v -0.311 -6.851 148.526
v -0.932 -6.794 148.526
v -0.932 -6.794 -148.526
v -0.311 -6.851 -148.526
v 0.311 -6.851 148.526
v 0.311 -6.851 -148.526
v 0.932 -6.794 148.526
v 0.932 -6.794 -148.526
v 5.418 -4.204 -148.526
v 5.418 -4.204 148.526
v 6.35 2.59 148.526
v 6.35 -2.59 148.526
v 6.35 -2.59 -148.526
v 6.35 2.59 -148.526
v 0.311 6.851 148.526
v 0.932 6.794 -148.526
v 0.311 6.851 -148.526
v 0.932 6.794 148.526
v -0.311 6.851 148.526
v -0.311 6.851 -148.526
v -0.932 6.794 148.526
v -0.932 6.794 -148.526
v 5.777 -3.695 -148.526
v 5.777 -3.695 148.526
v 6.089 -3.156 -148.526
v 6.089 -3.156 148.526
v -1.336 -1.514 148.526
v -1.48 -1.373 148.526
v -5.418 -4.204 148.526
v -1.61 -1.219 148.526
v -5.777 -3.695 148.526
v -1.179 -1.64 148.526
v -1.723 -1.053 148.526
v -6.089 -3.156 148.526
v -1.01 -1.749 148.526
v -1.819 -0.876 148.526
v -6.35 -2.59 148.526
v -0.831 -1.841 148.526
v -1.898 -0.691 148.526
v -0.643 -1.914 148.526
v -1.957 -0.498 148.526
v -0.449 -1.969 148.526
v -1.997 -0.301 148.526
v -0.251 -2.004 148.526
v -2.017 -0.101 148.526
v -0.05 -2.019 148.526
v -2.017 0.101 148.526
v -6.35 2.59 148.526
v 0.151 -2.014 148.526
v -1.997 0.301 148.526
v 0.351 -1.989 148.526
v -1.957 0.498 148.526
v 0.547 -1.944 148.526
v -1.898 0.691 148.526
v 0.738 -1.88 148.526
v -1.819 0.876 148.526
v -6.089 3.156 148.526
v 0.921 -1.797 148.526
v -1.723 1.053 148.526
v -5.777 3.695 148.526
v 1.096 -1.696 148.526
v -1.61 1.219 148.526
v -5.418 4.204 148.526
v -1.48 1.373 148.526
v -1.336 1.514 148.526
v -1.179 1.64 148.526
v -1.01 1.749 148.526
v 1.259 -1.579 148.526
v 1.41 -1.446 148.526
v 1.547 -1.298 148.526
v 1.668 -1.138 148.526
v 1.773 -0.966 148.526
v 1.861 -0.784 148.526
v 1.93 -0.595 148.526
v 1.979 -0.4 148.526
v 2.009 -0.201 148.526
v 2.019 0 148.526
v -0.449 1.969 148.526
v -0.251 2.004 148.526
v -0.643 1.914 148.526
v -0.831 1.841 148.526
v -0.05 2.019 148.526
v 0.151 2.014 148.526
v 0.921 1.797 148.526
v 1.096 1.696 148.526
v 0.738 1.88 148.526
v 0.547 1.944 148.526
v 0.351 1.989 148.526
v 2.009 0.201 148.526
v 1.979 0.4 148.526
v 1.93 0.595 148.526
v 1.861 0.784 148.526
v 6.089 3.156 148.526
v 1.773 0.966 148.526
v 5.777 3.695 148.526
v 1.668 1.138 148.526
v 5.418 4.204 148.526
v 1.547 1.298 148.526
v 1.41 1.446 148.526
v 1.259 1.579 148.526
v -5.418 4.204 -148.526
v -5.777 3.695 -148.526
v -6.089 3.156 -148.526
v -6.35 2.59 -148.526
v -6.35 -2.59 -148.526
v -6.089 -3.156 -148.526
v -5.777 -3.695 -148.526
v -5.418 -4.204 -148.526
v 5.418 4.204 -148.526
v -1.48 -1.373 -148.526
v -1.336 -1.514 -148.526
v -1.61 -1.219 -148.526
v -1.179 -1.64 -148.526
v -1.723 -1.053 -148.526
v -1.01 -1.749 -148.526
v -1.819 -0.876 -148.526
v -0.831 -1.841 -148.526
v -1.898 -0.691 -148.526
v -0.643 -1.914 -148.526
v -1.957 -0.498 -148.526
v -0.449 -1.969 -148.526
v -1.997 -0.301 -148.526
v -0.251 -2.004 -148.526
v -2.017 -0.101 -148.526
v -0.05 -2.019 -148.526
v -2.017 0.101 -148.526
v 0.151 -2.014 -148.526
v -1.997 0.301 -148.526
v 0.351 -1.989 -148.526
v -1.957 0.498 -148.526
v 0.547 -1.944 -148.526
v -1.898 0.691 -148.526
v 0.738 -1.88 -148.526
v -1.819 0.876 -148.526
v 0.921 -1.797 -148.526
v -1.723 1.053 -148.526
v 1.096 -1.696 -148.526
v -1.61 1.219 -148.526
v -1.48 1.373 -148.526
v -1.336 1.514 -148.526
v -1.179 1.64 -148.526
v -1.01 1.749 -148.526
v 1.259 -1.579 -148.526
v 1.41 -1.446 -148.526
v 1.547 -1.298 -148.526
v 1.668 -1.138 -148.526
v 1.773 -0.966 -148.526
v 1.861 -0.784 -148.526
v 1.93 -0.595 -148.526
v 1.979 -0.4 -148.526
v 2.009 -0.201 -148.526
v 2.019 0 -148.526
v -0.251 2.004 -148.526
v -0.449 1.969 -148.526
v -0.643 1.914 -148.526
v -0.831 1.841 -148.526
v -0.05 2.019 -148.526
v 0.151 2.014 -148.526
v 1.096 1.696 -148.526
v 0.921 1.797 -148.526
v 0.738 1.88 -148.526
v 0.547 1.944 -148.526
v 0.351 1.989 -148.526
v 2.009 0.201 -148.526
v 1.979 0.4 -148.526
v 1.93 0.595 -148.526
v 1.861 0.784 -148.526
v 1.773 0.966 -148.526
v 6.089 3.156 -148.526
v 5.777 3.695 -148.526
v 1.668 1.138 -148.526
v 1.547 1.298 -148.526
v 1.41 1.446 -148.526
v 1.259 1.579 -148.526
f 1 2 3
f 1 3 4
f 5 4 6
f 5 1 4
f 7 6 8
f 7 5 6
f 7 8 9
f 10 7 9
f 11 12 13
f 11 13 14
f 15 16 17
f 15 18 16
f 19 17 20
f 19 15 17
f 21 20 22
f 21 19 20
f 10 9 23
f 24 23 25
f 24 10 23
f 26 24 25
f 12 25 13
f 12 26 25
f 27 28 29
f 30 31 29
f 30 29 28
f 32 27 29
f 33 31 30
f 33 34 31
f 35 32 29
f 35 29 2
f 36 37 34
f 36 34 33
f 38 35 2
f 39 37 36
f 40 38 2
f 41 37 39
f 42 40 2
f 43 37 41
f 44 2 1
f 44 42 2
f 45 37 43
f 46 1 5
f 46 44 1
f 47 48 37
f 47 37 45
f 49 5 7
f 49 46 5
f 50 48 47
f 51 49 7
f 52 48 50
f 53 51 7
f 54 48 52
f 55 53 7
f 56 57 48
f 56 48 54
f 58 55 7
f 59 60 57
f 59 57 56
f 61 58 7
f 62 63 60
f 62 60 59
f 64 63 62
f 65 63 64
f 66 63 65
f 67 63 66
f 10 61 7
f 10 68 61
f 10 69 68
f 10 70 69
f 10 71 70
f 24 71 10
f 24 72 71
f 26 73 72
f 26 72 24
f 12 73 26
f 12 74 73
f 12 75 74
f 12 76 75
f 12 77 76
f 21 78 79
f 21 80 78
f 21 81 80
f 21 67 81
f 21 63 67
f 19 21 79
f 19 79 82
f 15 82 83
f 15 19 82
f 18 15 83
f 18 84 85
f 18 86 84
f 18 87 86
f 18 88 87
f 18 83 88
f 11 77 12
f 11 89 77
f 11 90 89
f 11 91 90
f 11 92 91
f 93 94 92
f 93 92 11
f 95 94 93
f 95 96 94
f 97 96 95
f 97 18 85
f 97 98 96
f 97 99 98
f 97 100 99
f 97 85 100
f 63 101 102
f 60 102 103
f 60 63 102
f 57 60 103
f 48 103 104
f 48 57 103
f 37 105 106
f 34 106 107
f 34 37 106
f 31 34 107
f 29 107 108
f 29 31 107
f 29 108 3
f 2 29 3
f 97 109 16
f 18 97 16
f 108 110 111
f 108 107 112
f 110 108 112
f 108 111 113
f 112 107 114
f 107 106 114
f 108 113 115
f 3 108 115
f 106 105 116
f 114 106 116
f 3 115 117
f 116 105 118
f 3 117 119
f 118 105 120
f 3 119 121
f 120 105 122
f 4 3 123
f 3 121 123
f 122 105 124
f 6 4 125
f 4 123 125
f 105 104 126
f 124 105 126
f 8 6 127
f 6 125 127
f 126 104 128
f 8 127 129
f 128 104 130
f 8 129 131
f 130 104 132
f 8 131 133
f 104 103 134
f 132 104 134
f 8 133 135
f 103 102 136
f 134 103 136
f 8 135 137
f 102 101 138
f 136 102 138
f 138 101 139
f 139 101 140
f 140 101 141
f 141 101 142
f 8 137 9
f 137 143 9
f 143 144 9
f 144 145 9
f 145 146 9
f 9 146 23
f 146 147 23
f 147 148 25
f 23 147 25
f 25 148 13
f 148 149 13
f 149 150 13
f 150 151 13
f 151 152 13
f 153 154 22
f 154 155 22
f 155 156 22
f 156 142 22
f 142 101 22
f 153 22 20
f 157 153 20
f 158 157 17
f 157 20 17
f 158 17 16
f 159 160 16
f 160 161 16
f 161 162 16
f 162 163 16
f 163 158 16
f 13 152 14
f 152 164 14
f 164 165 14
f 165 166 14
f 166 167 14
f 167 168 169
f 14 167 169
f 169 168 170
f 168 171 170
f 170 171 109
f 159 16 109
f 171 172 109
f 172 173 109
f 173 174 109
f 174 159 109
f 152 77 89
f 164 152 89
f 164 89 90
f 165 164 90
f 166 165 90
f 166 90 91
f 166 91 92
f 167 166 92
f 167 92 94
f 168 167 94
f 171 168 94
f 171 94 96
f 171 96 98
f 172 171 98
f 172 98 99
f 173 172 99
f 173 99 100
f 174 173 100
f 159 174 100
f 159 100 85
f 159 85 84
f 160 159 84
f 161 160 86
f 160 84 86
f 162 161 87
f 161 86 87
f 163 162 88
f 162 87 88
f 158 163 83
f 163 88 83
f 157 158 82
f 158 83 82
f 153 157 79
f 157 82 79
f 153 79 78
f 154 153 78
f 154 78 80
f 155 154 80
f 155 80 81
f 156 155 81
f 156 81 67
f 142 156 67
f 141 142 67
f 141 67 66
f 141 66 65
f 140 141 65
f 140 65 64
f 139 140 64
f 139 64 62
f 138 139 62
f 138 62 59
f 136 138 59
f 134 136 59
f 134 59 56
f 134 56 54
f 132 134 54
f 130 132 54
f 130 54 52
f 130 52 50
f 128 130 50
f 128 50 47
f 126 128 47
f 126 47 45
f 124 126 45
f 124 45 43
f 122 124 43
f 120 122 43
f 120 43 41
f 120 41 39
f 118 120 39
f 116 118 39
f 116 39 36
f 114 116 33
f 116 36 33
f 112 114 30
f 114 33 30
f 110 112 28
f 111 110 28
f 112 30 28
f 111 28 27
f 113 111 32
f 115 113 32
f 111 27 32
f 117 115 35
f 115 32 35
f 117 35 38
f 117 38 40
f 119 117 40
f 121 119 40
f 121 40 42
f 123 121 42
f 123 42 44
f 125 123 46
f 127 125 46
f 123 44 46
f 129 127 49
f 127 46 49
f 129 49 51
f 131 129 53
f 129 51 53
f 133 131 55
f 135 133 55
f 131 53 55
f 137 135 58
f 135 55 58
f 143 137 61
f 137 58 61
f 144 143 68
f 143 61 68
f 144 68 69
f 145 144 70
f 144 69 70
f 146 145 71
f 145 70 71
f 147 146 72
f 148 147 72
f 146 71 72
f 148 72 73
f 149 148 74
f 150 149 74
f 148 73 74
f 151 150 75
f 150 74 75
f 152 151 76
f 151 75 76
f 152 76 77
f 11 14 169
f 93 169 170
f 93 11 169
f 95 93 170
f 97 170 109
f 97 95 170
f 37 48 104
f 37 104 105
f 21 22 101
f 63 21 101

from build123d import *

# Parameters (mm, degrees)
BOSS_EXTRUDE1_DEPTH = 148.5265
SKETCH2_R           = 2.0193
CUT_EXTRUDE1_DEPTH  = 298.199999113


with BuildPart() as part:
    # Sketch1 → Boss-Extrude1 (new, symmetric)
    with BuildSketch(Plane.XY):
        with BuildLine():
            ThreePointArc((0.93173274, 6.79441227), (0, 6.858), (-0.93173274, 6.79441227))
            Line((-0.93173274, 6.79441227), (-5.41826726, 4.204110358))
            ThreePointArc((-5.41826726, 4.204110358), (-5.939202219, 3.429), (-6.35, 2.590301913))
            Line((-6.35, 2.590301913), (-6.35, -2.590301913))
            ThreePointArc((-6.35, -2.590301913), (-5.939202219, -3.429), (-5.41826726, -4.204110358))
            Line((-5.41826726, -4.204110358), (-0.93173274, -6.79441227))
            ThreePointArc((-0.93173274, -6.79441227), (0, -6.858), (0.93173274, -6.79441227))
            Line((0.93173274, -6.79441227), (5.41826726, -4.204110358))
            ThreePointArc((5.41826726, -4.204110358), (5.939202219, -3.429), (6.35, -2.590301913))
            Line((6.35, -2.590301913), (6.35, 2.590301913))
            ThreePointArc((6.35, 2.590301913), (5.939202219, 3.429), (5.41826726, 4.204110358))
            Line((5.41826726, 4.204110358), (0.93173274, 6.79441227))
        make_face()
    extrude(amount=BOSS_EXTRUDE1_DEPTH, both=True)

    # Sketch2 → Cut-Extrude1 (cut, through all)
    with BuildSketch(Plane.XY.offset(148.5265)):
        Circle(SKETCH2_R)
    extrude(amount=-CUT_EXTRUDE1_DEPTH, mode=Mode.SUBTRACT)


solid = part.part
